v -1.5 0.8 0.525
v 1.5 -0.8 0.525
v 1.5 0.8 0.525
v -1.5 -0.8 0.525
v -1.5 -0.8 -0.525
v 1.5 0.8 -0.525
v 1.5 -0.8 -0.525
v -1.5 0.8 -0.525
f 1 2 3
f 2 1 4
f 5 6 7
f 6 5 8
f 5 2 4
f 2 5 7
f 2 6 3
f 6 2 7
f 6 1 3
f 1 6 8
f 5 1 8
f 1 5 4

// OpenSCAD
module smd() {
    translate([-1.5, -0.8, -0.525])
        cube([3.0, 1.6, 1.05]);
}

smd();
